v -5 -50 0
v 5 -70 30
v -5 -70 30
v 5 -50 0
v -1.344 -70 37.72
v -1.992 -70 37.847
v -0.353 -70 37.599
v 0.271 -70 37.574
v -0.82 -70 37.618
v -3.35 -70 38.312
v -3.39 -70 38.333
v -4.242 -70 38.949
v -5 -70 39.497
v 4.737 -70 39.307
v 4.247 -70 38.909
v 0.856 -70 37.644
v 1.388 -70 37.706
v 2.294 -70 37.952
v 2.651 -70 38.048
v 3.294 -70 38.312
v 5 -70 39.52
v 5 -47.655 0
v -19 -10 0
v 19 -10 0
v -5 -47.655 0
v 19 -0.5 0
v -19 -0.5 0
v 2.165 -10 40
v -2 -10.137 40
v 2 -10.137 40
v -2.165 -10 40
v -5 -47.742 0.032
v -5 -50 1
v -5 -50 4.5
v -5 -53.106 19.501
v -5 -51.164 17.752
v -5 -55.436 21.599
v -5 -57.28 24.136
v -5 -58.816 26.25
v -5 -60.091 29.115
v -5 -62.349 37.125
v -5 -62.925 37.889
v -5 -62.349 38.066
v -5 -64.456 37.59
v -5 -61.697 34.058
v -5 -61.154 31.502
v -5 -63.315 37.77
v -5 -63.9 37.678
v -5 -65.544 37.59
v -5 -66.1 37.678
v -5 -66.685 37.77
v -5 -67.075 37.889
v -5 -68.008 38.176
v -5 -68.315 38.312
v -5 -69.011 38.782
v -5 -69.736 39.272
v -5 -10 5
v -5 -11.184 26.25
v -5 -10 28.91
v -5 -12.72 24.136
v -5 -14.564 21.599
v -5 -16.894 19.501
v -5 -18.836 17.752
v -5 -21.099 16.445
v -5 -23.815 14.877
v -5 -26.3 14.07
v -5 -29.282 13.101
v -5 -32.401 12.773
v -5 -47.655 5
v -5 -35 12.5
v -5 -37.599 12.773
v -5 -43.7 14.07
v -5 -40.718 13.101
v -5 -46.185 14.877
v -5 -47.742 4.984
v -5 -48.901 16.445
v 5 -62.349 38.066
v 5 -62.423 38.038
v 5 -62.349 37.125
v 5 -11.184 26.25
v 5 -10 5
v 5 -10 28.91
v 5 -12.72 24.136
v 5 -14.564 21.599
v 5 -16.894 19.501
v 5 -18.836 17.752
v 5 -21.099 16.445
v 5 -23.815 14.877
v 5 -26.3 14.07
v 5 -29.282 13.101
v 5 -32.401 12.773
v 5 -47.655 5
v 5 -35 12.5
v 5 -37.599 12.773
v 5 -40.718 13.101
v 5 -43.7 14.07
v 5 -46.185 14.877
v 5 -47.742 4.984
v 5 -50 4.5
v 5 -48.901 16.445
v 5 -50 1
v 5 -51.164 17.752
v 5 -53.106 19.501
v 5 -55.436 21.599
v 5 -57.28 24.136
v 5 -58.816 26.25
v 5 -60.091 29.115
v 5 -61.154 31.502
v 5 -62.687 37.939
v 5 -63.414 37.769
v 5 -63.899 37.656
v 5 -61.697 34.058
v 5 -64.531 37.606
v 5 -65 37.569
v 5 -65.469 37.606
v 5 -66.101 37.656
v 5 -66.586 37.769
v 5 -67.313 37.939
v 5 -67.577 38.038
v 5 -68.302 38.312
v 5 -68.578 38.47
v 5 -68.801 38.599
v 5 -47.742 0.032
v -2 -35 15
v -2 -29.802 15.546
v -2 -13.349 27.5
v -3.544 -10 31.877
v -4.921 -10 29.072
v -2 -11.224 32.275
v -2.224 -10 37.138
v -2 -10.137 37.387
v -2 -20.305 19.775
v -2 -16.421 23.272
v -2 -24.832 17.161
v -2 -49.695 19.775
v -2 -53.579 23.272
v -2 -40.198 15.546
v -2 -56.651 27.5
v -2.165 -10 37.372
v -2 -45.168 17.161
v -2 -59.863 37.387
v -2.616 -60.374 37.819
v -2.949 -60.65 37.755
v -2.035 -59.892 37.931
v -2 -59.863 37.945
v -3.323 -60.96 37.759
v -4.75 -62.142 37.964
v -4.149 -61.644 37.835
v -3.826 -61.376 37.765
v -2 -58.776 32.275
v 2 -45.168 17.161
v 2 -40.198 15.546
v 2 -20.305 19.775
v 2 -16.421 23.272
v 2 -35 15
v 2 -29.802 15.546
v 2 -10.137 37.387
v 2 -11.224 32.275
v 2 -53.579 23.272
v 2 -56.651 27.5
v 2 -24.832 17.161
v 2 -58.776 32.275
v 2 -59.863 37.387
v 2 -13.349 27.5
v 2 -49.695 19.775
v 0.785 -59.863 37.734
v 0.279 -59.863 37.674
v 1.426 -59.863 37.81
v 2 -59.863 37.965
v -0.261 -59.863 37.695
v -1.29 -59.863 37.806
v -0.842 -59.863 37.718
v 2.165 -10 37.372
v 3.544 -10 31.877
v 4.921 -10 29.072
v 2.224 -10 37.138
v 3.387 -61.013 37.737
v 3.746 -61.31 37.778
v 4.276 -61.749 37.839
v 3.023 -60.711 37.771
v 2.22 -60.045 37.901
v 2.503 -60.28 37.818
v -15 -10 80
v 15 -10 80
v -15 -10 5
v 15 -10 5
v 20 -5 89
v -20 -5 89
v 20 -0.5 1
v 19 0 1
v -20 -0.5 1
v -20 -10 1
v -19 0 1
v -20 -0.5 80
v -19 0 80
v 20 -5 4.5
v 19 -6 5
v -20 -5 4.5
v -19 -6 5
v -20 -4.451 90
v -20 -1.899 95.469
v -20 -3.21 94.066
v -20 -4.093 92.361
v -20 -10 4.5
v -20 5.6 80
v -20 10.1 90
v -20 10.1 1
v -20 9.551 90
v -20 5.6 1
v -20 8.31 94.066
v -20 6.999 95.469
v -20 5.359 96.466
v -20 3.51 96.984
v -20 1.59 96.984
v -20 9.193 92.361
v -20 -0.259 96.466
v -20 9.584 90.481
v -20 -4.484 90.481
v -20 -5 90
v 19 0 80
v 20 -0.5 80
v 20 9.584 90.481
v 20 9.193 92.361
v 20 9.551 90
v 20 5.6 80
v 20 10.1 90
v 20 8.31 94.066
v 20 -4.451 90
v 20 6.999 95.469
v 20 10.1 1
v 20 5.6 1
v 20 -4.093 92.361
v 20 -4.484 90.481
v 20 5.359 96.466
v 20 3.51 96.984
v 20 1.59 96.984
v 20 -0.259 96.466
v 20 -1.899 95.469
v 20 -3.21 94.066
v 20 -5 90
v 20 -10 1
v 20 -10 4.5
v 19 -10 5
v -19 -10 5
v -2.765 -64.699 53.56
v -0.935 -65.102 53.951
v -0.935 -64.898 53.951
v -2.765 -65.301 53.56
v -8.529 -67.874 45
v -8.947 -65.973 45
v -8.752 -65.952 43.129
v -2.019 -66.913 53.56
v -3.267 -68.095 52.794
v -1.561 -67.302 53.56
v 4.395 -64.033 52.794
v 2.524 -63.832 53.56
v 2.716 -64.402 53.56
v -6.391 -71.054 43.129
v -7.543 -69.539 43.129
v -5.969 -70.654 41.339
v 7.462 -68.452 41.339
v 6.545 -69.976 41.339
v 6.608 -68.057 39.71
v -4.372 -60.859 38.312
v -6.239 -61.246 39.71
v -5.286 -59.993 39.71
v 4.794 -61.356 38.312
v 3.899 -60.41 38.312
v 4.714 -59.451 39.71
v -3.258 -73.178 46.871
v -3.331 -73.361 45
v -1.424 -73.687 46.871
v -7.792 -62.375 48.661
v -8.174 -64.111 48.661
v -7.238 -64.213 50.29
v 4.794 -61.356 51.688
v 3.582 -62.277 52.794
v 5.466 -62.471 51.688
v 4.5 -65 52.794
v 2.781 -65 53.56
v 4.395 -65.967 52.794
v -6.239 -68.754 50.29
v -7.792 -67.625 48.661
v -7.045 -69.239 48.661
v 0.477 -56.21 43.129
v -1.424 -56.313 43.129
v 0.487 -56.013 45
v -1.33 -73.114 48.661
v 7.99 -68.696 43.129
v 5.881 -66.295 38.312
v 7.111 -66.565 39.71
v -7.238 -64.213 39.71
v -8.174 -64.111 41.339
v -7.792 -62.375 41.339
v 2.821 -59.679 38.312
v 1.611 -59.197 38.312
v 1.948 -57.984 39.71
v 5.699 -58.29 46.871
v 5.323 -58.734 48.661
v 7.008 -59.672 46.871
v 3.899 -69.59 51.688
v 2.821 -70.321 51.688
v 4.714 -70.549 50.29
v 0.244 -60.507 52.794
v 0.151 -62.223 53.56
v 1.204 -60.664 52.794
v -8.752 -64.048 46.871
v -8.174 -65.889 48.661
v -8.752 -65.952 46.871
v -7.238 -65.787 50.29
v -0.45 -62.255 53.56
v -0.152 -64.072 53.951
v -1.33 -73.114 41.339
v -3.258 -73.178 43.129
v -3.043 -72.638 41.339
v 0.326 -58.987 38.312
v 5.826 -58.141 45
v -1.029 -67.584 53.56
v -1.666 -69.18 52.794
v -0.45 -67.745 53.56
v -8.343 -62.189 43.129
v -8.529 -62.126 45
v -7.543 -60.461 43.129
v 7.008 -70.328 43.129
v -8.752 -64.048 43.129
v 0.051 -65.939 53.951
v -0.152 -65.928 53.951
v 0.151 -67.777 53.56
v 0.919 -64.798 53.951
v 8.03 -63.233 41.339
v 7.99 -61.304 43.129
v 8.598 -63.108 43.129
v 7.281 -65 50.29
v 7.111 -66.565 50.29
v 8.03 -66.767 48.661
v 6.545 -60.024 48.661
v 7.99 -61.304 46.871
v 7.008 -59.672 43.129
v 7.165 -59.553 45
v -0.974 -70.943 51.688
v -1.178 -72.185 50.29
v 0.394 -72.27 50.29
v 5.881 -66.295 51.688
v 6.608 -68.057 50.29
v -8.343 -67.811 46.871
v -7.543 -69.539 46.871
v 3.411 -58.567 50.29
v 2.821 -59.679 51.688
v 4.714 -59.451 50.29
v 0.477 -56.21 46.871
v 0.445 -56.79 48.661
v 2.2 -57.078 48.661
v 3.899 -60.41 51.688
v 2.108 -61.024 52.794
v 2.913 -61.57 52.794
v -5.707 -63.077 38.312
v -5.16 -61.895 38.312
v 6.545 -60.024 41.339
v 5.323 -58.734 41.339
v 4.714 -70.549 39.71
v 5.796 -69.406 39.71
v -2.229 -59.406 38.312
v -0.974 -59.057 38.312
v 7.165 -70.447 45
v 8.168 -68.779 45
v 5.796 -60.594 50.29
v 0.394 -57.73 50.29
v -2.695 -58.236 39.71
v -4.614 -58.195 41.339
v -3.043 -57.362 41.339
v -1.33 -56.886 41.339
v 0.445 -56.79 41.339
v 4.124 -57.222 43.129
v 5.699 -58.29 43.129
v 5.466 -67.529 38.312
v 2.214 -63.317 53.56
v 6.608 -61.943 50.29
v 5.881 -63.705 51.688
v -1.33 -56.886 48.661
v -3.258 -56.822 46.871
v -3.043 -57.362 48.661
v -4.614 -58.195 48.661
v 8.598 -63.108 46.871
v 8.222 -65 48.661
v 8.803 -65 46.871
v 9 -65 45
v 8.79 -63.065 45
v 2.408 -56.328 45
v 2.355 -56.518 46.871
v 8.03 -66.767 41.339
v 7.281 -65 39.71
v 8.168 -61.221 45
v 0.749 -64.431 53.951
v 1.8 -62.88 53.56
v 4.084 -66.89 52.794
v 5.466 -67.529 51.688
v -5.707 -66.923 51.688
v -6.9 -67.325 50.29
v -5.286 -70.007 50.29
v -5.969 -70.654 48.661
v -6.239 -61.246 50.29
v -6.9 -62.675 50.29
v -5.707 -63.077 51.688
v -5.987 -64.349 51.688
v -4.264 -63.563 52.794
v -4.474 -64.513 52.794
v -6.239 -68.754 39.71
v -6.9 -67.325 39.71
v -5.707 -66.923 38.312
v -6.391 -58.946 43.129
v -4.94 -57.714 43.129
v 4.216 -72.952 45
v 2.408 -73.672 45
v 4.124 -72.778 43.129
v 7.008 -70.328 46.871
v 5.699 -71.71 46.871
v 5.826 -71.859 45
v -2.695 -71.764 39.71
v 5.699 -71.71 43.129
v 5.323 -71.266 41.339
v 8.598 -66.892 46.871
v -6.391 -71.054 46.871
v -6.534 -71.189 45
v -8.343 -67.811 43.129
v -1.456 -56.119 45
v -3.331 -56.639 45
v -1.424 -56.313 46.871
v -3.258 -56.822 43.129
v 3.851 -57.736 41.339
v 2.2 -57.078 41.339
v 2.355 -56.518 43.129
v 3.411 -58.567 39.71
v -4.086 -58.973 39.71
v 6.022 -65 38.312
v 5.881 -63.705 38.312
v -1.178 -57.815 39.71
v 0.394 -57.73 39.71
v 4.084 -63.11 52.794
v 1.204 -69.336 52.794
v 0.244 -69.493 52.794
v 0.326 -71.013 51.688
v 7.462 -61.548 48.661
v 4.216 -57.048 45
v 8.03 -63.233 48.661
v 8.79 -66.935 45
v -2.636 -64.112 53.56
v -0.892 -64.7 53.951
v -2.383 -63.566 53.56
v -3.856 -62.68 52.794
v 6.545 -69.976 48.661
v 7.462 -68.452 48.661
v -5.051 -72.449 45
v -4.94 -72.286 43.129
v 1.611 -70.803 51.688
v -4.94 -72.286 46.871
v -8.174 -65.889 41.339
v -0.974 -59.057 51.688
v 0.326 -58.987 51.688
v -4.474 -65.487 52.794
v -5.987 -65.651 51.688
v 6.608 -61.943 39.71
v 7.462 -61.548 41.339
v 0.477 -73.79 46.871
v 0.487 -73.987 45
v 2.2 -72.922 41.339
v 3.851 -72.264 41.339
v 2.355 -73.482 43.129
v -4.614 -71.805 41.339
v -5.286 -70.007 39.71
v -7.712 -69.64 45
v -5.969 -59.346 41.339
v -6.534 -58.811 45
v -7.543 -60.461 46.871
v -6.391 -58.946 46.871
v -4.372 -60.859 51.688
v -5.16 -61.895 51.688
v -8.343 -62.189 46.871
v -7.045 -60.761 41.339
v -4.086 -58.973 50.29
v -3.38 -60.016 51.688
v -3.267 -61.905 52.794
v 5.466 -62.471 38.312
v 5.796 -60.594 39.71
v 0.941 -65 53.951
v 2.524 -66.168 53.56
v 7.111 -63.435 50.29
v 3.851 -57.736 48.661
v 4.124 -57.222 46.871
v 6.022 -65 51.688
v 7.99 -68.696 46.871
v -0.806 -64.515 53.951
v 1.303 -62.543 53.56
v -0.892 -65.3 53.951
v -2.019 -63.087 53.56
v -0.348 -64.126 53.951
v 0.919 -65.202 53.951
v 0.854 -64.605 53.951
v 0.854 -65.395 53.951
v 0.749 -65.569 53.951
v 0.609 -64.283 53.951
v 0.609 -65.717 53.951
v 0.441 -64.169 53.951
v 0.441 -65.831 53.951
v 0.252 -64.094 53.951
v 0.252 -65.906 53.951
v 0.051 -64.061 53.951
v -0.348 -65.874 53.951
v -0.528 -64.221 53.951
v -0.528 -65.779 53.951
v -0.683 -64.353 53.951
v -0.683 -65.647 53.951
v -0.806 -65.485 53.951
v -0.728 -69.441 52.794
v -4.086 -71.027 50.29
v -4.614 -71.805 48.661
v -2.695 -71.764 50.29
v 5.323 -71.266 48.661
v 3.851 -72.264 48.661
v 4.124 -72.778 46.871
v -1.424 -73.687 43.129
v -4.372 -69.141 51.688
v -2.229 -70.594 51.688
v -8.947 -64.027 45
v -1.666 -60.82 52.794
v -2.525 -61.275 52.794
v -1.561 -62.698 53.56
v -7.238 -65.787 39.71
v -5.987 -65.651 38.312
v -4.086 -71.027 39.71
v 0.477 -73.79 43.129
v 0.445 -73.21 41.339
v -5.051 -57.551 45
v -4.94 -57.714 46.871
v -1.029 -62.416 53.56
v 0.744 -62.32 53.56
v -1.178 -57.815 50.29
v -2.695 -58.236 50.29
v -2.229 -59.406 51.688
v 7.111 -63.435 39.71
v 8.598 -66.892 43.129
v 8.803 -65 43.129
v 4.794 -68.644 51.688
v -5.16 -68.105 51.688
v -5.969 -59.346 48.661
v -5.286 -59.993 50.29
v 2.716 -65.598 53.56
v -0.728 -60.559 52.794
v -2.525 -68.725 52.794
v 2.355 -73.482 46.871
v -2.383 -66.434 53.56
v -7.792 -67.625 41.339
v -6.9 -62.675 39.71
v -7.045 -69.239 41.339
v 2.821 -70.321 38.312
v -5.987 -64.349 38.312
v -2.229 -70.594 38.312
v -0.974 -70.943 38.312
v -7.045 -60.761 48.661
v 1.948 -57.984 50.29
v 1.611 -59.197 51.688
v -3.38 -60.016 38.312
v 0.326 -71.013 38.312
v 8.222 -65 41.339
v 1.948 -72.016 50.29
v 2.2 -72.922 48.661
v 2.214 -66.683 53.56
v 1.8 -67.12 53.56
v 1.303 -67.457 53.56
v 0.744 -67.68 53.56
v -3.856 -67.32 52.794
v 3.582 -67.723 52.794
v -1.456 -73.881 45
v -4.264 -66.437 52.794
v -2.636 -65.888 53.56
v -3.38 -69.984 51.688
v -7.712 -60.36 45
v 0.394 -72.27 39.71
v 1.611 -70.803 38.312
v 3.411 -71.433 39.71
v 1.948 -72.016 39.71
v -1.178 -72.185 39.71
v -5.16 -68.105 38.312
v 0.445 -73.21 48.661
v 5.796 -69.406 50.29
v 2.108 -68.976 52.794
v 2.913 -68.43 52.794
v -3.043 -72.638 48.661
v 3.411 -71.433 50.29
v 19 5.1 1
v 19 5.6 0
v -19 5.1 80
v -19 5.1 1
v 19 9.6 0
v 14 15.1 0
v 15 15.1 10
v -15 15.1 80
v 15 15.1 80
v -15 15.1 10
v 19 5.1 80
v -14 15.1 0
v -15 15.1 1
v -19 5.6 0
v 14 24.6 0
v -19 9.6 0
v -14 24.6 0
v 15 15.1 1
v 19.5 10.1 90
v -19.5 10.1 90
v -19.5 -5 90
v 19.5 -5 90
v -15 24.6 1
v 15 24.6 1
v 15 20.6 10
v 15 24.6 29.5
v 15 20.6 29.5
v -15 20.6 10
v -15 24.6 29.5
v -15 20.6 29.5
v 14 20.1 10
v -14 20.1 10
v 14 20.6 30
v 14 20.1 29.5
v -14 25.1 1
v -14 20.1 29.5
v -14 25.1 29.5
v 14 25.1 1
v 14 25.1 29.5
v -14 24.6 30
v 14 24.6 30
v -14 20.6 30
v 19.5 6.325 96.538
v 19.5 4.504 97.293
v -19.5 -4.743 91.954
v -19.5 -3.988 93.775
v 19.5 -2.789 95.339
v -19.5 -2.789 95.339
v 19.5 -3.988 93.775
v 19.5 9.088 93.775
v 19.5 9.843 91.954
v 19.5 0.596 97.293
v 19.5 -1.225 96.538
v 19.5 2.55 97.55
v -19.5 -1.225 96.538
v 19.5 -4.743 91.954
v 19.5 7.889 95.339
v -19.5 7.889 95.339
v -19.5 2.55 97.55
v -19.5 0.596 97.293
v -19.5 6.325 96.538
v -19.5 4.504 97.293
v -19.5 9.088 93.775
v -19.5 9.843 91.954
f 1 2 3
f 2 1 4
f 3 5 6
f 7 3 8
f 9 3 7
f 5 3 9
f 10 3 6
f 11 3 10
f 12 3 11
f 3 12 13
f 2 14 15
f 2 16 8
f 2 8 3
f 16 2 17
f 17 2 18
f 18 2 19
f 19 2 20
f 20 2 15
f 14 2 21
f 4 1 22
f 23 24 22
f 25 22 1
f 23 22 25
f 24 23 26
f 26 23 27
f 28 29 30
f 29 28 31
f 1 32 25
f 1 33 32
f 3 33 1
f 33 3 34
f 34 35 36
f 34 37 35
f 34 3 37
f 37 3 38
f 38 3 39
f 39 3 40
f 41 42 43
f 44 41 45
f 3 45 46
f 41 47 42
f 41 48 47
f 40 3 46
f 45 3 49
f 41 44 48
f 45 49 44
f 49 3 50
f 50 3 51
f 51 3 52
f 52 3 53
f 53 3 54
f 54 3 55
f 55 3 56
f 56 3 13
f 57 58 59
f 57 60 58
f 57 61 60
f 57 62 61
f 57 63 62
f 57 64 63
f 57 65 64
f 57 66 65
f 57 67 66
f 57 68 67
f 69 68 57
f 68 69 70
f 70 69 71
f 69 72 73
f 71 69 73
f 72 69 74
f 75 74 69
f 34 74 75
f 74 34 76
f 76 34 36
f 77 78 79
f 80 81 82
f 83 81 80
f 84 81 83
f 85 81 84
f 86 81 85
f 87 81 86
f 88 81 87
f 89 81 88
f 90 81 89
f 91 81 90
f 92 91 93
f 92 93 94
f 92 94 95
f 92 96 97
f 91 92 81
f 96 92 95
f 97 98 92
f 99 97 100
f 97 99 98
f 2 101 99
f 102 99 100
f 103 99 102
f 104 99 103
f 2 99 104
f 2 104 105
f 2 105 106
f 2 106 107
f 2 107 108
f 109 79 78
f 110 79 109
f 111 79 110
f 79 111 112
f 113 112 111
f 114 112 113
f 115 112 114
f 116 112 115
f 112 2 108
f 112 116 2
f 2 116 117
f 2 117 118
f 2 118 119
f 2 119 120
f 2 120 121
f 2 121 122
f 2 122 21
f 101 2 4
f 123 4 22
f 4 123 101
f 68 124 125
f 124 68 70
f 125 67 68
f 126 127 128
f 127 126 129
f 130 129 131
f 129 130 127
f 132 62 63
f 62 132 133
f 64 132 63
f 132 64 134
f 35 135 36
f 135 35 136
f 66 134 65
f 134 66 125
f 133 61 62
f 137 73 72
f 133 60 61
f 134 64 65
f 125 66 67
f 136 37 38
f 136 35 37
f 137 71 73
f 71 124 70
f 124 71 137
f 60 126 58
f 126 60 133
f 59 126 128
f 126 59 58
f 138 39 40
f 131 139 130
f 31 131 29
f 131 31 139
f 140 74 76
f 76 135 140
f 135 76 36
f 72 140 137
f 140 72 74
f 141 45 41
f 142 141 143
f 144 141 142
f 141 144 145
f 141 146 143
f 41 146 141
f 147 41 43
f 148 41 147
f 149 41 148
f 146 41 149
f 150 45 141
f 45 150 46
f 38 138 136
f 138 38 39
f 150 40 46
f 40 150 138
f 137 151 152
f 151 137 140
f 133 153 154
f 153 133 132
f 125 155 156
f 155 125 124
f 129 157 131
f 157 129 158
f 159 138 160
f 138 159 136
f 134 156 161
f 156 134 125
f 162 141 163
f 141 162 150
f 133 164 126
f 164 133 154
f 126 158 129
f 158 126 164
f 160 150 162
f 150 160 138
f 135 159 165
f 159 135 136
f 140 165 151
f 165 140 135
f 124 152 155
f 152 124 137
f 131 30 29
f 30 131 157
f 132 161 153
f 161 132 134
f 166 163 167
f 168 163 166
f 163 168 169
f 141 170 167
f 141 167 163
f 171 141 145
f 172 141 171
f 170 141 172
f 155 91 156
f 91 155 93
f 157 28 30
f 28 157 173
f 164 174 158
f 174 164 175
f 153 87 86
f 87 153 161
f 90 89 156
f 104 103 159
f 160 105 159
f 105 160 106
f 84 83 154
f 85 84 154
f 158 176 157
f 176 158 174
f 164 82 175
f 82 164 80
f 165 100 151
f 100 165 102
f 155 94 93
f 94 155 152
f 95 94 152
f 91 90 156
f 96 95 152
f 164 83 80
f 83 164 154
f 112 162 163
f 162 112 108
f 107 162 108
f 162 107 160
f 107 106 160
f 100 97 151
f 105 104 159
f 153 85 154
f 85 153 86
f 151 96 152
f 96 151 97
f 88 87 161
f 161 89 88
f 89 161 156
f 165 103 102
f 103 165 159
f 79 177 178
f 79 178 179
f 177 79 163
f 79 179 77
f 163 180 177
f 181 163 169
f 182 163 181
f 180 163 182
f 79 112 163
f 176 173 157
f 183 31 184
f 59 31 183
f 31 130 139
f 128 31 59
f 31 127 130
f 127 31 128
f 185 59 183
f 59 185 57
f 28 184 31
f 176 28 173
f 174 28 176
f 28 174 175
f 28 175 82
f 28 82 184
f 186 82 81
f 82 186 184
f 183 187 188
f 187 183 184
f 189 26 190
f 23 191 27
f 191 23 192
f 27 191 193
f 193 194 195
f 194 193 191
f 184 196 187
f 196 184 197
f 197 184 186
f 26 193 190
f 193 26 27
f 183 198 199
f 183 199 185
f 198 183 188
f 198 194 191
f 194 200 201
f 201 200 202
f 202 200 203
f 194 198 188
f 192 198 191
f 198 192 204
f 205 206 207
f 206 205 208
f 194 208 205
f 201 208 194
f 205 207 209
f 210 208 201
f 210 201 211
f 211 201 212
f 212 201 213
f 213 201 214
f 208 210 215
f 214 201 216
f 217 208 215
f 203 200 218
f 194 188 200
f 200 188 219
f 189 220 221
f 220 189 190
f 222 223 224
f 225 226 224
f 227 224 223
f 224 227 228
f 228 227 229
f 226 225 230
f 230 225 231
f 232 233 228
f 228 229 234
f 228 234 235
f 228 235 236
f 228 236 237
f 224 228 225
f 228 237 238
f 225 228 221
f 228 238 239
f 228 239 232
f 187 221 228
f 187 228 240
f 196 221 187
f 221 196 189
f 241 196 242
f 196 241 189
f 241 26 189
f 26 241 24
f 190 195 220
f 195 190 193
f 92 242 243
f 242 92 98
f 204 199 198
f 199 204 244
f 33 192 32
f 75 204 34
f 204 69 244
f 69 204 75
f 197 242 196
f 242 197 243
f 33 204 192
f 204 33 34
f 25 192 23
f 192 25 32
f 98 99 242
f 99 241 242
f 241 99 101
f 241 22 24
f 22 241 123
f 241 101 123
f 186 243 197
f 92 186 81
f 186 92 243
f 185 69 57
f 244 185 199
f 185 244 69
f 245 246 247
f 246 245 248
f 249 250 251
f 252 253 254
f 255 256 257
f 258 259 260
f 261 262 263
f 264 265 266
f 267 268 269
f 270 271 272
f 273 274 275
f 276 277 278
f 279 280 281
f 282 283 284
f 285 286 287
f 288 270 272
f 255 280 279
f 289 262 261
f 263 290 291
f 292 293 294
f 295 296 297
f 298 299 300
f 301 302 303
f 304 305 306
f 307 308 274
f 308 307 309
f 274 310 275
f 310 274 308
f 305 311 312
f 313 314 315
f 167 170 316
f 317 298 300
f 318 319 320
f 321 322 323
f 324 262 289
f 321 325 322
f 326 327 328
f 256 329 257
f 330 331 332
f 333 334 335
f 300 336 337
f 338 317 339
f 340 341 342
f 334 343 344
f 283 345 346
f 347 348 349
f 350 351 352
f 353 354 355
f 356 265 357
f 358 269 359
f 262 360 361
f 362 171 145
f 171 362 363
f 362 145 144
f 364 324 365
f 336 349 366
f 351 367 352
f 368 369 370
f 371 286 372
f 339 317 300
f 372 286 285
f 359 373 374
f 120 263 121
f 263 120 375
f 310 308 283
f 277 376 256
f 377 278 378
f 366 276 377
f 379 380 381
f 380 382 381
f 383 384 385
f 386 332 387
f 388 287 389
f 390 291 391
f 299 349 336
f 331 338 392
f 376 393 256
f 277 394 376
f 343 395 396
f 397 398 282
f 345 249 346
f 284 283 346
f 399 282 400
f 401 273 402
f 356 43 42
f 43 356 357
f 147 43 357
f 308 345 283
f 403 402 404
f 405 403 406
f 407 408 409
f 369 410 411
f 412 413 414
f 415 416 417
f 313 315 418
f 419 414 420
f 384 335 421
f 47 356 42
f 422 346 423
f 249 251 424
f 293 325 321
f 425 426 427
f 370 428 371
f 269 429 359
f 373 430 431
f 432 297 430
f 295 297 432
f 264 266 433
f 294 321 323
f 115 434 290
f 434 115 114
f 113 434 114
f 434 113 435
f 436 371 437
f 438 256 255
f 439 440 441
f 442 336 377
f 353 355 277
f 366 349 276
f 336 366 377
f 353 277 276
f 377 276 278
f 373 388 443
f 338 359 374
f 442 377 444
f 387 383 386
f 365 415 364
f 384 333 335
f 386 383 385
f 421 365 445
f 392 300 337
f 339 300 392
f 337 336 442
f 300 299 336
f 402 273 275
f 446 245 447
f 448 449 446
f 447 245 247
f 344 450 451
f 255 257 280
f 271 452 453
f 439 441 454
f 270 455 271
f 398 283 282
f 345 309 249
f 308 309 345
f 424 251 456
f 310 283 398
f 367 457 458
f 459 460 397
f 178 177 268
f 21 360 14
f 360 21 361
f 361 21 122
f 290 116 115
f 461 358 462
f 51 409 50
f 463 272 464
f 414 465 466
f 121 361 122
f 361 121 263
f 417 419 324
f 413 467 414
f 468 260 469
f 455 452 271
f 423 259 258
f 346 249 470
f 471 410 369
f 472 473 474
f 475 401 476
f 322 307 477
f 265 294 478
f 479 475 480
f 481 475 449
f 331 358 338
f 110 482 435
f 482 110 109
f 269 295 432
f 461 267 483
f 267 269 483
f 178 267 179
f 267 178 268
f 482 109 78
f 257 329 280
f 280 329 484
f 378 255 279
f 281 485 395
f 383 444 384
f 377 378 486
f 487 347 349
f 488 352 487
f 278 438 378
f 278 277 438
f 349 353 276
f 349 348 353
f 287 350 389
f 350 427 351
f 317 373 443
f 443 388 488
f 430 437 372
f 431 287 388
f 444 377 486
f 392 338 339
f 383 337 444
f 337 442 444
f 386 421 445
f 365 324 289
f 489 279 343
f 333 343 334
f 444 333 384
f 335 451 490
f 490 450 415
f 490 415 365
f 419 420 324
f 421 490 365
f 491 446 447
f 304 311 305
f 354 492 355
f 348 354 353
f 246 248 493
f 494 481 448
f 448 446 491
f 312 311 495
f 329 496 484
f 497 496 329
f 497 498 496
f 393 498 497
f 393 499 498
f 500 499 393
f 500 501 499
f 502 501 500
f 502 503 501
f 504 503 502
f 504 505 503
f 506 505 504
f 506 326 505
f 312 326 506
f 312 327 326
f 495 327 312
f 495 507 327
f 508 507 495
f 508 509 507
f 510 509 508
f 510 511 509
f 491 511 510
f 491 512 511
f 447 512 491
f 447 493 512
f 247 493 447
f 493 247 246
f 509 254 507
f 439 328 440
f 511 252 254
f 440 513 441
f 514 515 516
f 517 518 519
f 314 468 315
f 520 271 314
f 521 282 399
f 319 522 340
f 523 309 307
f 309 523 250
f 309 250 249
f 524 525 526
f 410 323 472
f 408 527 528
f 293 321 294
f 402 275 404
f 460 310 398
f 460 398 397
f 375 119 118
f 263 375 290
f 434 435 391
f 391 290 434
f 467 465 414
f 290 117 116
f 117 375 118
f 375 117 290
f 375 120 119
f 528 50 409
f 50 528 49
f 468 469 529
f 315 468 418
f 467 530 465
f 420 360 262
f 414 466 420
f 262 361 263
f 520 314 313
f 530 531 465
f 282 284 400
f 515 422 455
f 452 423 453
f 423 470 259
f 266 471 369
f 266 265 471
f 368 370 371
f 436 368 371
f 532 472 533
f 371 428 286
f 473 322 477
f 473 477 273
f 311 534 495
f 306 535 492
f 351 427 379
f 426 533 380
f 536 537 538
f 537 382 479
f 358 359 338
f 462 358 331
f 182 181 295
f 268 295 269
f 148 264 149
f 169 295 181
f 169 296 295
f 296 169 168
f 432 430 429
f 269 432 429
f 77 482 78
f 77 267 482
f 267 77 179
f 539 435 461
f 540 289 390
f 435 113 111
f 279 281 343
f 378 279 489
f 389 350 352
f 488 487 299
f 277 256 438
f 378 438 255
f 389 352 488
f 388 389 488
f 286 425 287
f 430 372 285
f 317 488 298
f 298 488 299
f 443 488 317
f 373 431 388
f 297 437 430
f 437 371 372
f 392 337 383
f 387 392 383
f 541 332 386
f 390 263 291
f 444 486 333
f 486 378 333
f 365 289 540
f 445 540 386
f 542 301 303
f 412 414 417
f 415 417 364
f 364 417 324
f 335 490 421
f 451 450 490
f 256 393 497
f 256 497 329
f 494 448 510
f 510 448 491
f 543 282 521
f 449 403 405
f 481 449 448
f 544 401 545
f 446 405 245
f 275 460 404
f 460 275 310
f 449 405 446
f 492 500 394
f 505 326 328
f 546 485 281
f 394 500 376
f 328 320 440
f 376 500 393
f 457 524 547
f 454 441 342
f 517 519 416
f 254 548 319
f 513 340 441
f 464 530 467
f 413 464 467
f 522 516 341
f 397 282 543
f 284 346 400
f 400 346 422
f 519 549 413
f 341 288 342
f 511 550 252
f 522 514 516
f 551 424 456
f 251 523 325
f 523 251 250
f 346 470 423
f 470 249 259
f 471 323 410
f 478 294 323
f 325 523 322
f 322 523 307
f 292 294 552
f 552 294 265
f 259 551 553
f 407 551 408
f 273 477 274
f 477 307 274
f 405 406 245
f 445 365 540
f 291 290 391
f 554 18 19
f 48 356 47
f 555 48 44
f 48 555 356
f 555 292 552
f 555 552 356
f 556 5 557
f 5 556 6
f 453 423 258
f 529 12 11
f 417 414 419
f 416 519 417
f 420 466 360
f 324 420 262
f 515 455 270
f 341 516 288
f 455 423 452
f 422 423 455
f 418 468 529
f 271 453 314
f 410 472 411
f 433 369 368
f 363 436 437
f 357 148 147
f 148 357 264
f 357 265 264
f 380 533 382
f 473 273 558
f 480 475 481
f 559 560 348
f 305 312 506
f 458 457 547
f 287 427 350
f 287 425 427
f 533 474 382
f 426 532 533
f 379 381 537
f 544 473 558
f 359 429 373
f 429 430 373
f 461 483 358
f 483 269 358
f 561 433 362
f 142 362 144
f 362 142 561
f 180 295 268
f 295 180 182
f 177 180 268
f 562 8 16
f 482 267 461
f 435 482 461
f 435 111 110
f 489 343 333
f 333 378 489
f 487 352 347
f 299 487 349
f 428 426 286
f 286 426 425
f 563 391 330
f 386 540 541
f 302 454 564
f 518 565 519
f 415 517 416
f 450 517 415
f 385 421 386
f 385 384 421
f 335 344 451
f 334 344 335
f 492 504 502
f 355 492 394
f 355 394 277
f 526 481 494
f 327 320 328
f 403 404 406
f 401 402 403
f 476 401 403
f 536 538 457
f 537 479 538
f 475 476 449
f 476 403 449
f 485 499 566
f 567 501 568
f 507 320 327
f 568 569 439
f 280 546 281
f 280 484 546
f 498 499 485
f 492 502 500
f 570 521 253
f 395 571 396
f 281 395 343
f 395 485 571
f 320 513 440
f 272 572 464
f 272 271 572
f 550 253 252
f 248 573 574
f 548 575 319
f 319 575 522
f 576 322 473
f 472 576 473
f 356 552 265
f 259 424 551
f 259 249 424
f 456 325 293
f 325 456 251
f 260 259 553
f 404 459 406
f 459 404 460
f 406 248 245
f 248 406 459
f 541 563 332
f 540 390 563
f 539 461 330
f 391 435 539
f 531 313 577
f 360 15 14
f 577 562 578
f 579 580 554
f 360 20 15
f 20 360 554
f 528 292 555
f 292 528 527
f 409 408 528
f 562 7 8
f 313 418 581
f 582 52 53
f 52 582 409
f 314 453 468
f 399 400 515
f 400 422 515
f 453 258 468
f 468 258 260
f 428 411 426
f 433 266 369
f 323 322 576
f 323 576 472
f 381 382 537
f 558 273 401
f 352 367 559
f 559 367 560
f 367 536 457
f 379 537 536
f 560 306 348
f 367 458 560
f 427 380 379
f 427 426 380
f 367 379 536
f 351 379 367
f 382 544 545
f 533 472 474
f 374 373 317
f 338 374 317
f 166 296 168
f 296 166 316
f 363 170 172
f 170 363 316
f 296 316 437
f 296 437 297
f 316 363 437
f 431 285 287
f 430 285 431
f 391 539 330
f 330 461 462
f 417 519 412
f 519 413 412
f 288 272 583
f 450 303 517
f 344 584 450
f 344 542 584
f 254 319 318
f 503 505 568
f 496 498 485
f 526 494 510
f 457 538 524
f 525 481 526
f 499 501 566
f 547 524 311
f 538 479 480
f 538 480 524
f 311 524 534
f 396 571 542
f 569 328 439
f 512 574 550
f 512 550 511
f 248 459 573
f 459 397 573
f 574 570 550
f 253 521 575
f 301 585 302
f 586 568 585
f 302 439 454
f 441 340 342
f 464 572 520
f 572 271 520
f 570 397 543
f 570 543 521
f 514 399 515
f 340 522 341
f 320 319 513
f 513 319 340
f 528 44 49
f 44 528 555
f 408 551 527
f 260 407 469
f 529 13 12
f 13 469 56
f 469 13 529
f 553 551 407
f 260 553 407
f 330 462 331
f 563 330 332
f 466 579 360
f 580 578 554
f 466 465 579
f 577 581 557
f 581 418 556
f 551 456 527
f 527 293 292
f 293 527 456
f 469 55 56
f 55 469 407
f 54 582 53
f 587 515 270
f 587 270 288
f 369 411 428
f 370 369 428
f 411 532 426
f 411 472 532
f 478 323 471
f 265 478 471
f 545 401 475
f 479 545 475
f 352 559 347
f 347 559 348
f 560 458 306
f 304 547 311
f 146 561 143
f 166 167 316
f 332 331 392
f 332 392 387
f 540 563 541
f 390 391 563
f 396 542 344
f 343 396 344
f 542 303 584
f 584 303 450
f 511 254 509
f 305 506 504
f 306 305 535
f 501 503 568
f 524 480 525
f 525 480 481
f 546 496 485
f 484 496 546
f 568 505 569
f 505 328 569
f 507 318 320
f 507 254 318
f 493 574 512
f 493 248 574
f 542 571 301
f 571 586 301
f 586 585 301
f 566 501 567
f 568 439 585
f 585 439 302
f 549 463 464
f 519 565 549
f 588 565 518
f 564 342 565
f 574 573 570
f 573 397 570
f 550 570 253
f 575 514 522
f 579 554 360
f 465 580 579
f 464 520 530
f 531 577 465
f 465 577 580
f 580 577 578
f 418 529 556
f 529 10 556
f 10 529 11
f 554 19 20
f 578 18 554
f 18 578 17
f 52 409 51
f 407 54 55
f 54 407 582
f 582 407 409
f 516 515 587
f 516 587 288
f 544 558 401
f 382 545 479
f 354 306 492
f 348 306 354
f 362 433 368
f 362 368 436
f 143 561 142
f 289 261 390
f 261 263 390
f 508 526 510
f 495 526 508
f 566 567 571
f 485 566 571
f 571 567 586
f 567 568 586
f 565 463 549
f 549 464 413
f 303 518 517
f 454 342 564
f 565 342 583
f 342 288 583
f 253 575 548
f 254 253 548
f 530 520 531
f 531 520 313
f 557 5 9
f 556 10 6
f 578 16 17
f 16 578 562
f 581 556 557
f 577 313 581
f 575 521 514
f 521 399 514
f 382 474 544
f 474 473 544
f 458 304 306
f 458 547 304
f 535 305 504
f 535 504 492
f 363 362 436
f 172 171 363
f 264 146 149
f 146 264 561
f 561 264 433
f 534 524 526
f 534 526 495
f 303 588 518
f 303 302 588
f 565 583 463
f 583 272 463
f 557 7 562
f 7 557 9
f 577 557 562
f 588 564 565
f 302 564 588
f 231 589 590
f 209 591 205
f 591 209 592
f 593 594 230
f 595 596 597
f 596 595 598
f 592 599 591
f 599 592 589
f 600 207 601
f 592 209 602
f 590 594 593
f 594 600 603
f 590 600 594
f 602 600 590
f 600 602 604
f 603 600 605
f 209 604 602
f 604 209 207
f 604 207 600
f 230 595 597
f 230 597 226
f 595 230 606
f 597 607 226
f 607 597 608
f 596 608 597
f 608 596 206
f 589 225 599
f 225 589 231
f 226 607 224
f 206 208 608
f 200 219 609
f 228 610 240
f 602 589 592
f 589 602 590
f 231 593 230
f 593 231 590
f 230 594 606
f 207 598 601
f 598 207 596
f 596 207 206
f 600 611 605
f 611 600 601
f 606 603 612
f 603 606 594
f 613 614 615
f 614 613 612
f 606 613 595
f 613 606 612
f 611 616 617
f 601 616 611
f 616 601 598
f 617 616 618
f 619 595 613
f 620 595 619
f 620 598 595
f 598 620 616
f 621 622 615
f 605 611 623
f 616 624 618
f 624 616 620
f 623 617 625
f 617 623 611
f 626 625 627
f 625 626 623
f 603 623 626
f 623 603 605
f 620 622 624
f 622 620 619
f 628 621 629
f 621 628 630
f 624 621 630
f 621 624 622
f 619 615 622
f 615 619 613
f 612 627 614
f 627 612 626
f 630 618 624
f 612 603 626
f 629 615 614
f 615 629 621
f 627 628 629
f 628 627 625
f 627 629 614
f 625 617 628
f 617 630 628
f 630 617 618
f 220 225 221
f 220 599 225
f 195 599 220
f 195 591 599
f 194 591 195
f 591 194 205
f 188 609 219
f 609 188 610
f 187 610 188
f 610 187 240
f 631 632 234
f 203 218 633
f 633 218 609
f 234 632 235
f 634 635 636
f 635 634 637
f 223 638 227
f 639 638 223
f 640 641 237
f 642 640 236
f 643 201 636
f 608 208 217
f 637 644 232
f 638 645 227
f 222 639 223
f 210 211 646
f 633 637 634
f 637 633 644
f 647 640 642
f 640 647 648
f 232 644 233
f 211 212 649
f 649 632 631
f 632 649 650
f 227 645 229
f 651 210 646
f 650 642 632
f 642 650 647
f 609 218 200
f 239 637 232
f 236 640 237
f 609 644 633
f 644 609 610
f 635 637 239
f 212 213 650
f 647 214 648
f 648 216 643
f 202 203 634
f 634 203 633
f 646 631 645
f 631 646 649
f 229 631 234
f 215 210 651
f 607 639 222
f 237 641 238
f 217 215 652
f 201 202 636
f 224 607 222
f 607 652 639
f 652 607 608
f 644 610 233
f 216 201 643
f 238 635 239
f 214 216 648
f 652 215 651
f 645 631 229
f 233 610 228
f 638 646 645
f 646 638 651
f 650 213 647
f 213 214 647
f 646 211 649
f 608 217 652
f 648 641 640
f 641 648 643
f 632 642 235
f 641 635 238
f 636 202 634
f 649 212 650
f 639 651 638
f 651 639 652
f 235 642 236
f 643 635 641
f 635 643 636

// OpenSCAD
module bath_hook_front() {
  hull() {
    translate([-19, -5, 1]) cube([38, 5, 88]);
    translate([-19, -5, 0]) cube([38, 4.5, 1]);
    translate([-20, -5, 1]) cube([40, 4.5, 88]);
    translate([-15, -10, 1]) cube([30, 5, 79]);
  }
  hull() {
    translate([-19, -10, 0]) cube([38, 9, 5]);
    translate([-19, -10, 1]) cube([38, 10, 3.5]);
    translate([-20, -10, 1]) cube([40, 9, 3.5]);
    translate([-4.5, -49, 0]) cube([9, 9, 5]);
    translate([-5, -50, 1]) cube([10, 10, 3.5]);
  }
  difference() {
    hull() {
      translate([-5, -50, 0]) cube([10, 49.5, 40]);
      translate([-5, -70, 30]) cube([10, 10, 10]);
    }
    translate([-8, -35, 40]) rotate([0, 90, 0]) cylinder(h=6, d1=60, d2=50);
    translate([-10, -35, 40]) rotate([0, 90, 0]) cylinder(h=20, d=50);
    translate([2, -35, 40]) rotate([0, 90, 0]) cylinder(h=6, d1=50, d2=60);
  }
  translate([0, -65, 45]) sphere(9);
}

module bath_hook_back() {
  hull () {
    translate([-19, 5.1, 1]) cube([38, 5, 89]);
    translate([-19, 5.6, 0]) cube([38, 4, 1]);
    translate([-20, 5.6, 1]) cube([40, 4.5, 89]);
    translate([-14, 10.1, 0]) cube([28, 5, 1]);
    translate([-15, 10.1, 1]) cube([30, 5, 79]);
  }
  hull() {
    translate([-14, 10.1, 0]) cube([28, 14.5, 1]);
    translate([-15, 10.1, 1]) cube([30, 14.5, 9]);
  }
  hull() {
    translate([-14, 20.1, 1]) cube([28, 5, 28.5]);
    translate([-14, 20.6, 0]) cube([28, 4, 30]);
    translate([-15, 20.6, 1]) cube([30, 4, 28.5]);
  }
}

module bath_hook_connection() {
  translate([-20, -5, 80]) cube([40, 15.1, 10]);
  hull() {
    translate([-20, 2.55, 90])
      rotate([0, 90, 0])
        cylinder(h=40, d=14.1);
    translate([-19.5, 2.55, 90])
      rotate([0, 90, 0])
        cylinder(h=39, d=15.1);
  }
}

module bath_hook() {
  bath_hook_front();
  bath_hook_back();
  bath_hook_connection();
}

bath_hook();
